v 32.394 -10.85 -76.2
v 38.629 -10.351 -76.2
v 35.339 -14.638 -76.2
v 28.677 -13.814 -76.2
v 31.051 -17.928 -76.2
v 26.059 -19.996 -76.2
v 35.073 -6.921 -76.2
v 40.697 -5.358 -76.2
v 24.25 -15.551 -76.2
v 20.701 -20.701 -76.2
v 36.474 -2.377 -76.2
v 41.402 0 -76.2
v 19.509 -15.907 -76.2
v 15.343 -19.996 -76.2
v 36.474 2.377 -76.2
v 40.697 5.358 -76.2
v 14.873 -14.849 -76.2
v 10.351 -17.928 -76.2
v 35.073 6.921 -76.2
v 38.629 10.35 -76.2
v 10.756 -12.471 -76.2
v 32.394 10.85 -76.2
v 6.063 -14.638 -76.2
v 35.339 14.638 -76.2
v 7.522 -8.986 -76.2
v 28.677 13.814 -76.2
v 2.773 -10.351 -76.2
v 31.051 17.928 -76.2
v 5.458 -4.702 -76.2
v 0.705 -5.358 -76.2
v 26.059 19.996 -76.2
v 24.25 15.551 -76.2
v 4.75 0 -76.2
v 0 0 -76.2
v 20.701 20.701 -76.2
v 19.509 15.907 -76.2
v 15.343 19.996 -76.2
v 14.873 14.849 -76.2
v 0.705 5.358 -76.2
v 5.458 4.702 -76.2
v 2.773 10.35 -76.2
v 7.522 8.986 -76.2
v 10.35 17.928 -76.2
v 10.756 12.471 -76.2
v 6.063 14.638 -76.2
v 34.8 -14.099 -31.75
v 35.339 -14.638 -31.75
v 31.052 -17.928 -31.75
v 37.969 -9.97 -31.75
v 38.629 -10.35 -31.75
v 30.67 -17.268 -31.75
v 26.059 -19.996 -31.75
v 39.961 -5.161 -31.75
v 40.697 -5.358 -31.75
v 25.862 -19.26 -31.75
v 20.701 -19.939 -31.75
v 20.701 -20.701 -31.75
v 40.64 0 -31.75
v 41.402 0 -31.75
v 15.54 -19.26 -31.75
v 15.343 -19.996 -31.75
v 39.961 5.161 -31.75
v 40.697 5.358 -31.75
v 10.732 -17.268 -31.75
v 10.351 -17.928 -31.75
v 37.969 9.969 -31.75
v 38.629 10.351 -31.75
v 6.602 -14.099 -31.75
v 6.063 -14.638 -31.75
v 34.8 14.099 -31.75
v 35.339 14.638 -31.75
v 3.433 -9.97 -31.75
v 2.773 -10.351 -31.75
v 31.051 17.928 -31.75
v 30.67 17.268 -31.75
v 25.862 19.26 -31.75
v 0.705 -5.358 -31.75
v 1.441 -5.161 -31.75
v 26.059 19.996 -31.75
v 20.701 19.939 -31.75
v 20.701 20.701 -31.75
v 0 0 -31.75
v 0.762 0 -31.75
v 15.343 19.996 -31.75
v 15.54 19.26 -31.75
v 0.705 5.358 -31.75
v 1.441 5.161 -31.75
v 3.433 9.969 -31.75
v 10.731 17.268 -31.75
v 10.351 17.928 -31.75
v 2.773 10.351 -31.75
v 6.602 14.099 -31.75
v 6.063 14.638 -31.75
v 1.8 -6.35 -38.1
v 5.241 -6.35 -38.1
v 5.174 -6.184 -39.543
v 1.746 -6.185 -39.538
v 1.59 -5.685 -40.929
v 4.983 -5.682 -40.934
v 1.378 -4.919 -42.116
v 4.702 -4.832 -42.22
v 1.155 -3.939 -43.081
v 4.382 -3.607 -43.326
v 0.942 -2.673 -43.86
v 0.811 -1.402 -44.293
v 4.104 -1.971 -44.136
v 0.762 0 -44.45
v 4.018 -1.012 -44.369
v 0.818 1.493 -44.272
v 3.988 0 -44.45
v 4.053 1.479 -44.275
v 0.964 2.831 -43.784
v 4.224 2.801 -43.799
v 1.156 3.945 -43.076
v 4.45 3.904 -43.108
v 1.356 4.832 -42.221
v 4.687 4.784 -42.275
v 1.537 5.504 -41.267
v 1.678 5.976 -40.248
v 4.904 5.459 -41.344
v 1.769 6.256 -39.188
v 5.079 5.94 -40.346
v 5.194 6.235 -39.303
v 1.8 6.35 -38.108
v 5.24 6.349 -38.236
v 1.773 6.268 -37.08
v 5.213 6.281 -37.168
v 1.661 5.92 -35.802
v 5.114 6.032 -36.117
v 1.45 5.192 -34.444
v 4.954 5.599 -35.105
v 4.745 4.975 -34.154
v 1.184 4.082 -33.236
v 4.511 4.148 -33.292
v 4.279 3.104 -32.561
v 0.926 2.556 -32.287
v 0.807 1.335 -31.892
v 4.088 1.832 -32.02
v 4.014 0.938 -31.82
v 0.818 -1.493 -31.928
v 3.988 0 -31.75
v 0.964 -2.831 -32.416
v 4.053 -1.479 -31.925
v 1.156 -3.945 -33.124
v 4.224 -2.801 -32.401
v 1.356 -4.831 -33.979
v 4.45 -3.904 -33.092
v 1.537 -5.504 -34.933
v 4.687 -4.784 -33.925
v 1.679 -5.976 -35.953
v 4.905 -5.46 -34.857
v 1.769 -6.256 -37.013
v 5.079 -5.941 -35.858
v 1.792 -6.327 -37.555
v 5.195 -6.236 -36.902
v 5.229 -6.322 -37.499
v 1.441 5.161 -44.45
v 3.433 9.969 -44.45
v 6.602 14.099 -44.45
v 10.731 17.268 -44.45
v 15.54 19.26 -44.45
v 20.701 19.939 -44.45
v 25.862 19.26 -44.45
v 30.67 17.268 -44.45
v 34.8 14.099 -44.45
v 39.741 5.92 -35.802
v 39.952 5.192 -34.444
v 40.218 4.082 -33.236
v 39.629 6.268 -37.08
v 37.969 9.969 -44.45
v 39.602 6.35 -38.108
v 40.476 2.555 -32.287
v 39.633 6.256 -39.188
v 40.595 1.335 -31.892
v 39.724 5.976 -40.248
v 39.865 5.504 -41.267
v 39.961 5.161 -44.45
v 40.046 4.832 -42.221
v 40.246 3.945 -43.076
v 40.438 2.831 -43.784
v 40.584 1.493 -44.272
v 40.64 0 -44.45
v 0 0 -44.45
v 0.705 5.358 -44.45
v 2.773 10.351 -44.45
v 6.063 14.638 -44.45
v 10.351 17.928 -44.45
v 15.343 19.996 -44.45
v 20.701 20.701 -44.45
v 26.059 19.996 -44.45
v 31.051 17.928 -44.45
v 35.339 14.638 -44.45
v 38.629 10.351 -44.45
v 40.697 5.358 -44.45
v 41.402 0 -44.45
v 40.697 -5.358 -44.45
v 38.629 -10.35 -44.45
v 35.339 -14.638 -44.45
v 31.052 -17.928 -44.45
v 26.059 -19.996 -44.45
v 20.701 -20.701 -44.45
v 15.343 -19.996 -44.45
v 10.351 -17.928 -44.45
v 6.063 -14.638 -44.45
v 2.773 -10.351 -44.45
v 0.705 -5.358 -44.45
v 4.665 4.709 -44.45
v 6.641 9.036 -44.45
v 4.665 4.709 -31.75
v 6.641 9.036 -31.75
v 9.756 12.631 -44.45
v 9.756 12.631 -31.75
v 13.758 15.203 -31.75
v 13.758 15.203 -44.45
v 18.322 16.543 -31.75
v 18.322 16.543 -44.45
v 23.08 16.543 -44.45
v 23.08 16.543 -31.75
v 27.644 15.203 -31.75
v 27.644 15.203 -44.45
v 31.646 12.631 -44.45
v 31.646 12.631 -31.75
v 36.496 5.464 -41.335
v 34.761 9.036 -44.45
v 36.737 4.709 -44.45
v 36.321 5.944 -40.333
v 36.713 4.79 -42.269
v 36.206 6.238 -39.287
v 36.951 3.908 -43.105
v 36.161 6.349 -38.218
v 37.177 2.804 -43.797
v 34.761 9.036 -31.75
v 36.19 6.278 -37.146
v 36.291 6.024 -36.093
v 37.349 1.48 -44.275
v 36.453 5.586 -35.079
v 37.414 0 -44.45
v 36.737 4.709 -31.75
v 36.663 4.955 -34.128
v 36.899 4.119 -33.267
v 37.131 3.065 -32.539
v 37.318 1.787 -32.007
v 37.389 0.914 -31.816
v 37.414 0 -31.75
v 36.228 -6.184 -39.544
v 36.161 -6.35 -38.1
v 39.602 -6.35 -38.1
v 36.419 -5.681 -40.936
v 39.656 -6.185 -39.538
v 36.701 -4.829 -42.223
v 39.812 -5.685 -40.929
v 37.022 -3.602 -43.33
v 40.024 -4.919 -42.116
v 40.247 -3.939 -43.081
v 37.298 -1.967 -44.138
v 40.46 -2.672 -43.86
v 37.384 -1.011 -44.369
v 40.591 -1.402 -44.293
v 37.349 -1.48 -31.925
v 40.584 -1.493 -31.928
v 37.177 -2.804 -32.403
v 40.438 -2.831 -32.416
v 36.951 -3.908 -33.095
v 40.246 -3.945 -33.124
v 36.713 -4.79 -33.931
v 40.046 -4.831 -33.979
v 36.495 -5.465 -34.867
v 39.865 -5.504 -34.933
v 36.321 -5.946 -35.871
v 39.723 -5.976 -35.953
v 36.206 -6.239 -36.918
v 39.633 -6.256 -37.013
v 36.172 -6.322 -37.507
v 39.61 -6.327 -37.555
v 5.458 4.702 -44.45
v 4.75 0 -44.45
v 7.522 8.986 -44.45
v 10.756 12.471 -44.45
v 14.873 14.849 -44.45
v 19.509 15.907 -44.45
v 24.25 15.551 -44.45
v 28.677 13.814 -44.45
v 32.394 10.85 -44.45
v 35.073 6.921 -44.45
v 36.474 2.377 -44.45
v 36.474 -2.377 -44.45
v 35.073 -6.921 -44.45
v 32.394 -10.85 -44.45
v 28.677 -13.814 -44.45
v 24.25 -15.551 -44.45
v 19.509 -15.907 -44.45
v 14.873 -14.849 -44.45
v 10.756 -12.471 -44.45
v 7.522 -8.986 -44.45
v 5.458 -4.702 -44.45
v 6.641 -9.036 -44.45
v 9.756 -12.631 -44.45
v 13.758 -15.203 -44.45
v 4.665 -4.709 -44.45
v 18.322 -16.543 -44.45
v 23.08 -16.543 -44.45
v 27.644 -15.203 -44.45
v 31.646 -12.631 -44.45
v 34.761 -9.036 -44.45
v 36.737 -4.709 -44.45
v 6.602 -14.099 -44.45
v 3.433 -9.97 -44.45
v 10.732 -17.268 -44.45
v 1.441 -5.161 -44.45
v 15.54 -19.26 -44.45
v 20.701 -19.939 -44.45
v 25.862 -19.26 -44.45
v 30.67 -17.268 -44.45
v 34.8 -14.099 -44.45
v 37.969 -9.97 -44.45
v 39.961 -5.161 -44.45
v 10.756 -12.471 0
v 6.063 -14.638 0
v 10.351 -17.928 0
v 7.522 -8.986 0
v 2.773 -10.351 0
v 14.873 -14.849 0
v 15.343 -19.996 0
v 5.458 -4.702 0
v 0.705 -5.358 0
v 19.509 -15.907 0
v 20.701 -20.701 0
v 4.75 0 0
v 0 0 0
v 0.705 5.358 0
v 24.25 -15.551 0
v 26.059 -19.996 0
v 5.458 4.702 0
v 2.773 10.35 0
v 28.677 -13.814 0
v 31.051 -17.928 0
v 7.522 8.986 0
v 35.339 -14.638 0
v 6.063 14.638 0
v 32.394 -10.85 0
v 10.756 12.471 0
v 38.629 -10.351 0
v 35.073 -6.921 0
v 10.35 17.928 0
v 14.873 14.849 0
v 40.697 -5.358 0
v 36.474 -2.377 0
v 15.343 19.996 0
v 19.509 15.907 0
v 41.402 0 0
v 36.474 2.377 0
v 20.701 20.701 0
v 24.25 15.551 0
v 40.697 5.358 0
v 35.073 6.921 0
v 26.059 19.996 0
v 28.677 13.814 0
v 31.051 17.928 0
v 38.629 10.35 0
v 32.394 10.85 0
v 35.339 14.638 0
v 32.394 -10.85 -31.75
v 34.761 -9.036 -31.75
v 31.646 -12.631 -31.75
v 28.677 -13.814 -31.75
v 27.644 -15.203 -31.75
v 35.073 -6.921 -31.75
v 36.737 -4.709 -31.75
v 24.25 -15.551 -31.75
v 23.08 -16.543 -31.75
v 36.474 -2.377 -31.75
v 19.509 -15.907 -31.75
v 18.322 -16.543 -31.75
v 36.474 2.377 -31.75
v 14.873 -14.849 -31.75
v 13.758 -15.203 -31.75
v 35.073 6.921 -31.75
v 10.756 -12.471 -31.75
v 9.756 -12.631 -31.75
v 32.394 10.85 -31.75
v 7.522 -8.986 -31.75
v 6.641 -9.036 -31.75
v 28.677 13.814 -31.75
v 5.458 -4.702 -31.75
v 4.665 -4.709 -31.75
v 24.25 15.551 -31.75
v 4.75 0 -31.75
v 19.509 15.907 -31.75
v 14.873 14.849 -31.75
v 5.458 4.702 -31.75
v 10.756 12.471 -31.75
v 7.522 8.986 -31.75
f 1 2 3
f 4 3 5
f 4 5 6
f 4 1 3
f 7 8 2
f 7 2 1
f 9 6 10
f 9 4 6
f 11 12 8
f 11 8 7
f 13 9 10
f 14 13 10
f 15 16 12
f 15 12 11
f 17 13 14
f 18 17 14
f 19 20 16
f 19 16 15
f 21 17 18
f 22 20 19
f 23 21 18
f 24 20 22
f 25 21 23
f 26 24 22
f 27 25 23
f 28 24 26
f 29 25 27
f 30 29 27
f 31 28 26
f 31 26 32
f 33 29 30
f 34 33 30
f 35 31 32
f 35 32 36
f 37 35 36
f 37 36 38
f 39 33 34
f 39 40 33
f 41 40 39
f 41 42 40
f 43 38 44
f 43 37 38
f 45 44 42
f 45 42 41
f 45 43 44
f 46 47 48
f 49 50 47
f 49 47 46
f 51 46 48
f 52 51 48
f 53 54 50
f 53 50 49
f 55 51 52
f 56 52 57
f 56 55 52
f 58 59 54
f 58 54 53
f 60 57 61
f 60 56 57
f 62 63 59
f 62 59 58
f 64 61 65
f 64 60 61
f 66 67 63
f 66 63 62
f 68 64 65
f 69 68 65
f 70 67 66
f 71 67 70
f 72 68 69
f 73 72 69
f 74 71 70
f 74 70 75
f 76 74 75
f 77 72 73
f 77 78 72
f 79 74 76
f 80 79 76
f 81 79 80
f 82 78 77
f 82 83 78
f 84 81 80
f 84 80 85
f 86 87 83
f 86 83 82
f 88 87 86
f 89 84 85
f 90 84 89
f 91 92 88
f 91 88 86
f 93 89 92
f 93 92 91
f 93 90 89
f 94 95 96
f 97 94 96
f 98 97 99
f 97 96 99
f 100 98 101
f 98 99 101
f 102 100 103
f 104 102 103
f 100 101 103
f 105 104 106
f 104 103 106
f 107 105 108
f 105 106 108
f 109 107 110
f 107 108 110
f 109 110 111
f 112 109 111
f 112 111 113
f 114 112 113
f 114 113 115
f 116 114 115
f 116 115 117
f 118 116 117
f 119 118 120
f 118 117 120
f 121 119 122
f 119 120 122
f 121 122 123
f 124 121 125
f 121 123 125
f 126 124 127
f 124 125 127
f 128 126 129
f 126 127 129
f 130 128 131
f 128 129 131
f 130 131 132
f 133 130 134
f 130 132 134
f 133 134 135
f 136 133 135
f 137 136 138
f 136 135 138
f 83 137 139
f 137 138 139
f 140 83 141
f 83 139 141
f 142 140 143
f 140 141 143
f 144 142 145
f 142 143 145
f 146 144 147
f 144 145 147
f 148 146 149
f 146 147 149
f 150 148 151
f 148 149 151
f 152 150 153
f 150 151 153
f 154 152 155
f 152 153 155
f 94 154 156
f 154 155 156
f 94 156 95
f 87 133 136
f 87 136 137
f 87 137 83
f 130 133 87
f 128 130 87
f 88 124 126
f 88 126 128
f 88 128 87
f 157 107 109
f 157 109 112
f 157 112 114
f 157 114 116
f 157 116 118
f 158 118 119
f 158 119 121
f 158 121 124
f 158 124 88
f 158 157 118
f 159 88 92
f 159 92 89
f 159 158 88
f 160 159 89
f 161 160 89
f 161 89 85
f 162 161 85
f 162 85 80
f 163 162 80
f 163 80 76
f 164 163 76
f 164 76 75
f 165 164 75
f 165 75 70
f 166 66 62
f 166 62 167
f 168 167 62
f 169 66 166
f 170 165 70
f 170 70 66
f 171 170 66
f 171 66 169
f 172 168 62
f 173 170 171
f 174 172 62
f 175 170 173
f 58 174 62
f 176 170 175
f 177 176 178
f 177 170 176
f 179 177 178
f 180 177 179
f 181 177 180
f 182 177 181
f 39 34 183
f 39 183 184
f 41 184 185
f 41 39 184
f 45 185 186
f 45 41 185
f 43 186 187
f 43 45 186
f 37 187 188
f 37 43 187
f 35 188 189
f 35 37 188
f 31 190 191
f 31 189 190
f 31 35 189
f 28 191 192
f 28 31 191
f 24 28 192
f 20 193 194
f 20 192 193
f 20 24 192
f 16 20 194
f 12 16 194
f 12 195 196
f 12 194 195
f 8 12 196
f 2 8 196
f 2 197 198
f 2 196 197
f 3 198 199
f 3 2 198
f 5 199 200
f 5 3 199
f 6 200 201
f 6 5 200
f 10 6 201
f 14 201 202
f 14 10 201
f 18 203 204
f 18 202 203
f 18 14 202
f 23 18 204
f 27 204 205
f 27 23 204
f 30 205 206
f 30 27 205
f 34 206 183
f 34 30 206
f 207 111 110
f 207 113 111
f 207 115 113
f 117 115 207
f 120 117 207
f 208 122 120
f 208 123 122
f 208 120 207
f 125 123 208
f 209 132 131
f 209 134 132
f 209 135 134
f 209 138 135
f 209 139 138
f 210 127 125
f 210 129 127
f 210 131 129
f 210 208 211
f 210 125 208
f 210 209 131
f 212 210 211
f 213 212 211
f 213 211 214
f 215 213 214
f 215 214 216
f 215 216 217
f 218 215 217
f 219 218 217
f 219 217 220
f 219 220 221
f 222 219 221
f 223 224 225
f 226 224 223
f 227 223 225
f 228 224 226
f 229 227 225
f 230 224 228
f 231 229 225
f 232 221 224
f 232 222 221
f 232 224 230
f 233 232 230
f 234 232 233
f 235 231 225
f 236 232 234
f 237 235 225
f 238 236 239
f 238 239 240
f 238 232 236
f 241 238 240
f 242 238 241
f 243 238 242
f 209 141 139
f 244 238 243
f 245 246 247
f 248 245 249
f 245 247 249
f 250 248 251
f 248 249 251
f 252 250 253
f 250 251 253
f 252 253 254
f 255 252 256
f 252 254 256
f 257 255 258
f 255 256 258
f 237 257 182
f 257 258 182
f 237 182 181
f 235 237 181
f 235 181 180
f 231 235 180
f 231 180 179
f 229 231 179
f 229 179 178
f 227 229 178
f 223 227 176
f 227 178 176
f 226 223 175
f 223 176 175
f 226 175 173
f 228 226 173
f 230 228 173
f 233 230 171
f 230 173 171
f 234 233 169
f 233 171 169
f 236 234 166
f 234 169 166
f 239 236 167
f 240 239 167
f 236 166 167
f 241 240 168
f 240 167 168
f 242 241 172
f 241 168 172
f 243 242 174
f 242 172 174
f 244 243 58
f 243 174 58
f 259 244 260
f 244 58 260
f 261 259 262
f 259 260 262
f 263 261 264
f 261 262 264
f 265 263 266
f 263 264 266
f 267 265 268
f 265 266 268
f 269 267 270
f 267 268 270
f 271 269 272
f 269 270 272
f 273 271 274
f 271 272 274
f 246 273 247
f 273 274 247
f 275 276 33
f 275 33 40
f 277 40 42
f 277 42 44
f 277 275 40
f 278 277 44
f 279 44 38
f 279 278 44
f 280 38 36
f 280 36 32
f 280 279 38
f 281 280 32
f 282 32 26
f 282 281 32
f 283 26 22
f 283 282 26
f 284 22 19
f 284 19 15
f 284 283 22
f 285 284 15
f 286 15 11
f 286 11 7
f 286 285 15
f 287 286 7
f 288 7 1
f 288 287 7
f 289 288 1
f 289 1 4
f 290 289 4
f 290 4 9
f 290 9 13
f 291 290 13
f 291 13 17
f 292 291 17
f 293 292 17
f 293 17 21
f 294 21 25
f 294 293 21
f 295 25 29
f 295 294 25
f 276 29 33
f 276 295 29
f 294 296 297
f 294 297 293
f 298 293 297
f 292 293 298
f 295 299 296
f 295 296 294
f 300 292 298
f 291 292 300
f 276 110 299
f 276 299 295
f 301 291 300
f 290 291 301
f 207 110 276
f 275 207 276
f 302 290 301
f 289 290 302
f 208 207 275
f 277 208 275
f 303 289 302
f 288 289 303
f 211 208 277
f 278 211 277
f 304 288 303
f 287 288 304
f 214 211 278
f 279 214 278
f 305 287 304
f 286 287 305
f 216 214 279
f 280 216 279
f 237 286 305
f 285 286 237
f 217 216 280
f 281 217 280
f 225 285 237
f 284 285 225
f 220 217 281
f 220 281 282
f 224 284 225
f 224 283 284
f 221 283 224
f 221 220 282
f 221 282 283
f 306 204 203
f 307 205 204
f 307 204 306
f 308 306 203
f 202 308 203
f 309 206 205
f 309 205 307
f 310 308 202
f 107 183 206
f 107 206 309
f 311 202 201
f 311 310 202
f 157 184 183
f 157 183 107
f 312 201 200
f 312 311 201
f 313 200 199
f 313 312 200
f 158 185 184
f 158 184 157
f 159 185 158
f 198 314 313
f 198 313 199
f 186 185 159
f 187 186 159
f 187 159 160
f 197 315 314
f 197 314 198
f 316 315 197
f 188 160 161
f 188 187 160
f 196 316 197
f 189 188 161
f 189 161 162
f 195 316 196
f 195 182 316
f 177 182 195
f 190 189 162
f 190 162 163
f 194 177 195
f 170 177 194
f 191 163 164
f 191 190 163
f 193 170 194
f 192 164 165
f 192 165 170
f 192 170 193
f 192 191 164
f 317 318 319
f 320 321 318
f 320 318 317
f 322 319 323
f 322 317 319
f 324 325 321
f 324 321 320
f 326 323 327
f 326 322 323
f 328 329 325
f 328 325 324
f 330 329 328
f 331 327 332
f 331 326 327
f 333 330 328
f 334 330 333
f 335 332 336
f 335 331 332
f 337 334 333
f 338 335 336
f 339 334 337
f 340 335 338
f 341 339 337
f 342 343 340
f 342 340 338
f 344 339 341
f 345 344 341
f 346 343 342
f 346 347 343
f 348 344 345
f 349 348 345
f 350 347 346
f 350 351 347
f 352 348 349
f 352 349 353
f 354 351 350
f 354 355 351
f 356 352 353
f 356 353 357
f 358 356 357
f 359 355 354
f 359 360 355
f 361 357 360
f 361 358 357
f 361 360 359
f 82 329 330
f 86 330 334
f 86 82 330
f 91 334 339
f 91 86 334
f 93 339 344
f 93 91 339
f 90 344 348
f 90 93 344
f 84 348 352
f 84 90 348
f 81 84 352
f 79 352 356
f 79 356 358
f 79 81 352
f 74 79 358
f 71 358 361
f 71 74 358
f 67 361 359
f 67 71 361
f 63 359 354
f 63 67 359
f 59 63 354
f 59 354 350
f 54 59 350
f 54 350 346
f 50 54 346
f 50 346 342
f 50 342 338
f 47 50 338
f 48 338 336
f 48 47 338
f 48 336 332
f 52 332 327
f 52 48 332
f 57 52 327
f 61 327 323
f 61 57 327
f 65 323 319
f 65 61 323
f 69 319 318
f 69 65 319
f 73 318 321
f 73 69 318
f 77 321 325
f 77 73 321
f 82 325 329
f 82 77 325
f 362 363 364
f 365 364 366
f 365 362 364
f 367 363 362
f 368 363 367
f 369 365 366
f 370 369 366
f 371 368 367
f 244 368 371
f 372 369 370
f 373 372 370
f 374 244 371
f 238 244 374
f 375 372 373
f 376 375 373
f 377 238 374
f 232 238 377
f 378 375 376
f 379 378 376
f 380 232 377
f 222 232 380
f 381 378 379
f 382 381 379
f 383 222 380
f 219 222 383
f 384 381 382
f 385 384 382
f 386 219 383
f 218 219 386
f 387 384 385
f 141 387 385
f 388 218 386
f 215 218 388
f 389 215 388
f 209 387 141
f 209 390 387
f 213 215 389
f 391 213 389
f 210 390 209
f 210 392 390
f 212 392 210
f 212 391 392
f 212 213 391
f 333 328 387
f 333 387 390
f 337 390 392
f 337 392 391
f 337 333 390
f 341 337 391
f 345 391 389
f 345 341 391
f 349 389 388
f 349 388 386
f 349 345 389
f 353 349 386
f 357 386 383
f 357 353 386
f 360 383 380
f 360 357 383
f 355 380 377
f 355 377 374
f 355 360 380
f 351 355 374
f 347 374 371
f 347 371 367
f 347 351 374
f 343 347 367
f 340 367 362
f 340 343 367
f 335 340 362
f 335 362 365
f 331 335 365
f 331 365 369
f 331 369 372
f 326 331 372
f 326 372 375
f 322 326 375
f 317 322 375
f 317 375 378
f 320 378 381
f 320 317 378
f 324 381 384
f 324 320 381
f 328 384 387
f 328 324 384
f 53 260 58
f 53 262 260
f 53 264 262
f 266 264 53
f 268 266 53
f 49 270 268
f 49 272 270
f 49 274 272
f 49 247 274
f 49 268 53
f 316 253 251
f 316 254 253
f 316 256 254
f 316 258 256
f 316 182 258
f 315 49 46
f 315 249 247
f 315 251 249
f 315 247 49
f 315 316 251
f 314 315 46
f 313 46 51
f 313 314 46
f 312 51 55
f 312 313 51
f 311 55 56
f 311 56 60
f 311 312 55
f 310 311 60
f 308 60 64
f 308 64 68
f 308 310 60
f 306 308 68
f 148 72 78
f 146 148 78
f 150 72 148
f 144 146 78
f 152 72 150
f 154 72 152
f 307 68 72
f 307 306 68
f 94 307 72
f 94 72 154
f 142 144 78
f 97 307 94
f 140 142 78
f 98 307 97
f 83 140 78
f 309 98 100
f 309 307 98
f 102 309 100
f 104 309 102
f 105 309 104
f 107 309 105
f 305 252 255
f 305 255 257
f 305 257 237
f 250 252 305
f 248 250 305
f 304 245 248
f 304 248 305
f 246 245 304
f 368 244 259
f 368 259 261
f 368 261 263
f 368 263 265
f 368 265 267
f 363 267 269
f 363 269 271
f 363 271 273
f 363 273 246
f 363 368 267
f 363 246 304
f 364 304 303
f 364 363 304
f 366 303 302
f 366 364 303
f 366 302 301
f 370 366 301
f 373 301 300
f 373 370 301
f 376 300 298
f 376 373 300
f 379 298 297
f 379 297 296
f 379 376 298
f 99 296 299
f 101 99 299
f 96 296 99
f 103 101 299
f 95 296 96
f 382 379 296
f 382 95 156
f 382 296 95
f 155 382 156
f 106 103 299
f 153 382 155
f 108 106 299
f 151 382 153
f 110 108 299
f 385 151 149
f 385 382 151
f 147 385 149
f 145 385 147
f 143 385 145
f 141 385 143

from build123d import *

# Parameters (mm, degrees)
F3_D = 12.7


with BuildPart() as f1:
    # F0 (on Front) → F1 (revolve)
    with BuildSketch(Plane.XZ):
        Polygon((4.7498, 0), (0, 0), (0, -31.75), (0.762, -31.75), (0.762, -44.45), (0, -44.45), (0, -76.2), (4.7498, -76.2), (4.7498, -44.45), (3.9878, -44.45), (3.9878, -31.75), (4.7498, -31.75), align=None)
    revolve(axis=Axis((20.701, 0, -38.1), (0, 0, -1)))

    # F3 (through all)
    with Locations(Plane(origin=(0, 0, 0), x_dir=(0, 1, 0), z_dir=(-1, 0, 0))):
        with Locations((0, 38.1)):
            Hole(F3_D / 2)


solid = f1.part
